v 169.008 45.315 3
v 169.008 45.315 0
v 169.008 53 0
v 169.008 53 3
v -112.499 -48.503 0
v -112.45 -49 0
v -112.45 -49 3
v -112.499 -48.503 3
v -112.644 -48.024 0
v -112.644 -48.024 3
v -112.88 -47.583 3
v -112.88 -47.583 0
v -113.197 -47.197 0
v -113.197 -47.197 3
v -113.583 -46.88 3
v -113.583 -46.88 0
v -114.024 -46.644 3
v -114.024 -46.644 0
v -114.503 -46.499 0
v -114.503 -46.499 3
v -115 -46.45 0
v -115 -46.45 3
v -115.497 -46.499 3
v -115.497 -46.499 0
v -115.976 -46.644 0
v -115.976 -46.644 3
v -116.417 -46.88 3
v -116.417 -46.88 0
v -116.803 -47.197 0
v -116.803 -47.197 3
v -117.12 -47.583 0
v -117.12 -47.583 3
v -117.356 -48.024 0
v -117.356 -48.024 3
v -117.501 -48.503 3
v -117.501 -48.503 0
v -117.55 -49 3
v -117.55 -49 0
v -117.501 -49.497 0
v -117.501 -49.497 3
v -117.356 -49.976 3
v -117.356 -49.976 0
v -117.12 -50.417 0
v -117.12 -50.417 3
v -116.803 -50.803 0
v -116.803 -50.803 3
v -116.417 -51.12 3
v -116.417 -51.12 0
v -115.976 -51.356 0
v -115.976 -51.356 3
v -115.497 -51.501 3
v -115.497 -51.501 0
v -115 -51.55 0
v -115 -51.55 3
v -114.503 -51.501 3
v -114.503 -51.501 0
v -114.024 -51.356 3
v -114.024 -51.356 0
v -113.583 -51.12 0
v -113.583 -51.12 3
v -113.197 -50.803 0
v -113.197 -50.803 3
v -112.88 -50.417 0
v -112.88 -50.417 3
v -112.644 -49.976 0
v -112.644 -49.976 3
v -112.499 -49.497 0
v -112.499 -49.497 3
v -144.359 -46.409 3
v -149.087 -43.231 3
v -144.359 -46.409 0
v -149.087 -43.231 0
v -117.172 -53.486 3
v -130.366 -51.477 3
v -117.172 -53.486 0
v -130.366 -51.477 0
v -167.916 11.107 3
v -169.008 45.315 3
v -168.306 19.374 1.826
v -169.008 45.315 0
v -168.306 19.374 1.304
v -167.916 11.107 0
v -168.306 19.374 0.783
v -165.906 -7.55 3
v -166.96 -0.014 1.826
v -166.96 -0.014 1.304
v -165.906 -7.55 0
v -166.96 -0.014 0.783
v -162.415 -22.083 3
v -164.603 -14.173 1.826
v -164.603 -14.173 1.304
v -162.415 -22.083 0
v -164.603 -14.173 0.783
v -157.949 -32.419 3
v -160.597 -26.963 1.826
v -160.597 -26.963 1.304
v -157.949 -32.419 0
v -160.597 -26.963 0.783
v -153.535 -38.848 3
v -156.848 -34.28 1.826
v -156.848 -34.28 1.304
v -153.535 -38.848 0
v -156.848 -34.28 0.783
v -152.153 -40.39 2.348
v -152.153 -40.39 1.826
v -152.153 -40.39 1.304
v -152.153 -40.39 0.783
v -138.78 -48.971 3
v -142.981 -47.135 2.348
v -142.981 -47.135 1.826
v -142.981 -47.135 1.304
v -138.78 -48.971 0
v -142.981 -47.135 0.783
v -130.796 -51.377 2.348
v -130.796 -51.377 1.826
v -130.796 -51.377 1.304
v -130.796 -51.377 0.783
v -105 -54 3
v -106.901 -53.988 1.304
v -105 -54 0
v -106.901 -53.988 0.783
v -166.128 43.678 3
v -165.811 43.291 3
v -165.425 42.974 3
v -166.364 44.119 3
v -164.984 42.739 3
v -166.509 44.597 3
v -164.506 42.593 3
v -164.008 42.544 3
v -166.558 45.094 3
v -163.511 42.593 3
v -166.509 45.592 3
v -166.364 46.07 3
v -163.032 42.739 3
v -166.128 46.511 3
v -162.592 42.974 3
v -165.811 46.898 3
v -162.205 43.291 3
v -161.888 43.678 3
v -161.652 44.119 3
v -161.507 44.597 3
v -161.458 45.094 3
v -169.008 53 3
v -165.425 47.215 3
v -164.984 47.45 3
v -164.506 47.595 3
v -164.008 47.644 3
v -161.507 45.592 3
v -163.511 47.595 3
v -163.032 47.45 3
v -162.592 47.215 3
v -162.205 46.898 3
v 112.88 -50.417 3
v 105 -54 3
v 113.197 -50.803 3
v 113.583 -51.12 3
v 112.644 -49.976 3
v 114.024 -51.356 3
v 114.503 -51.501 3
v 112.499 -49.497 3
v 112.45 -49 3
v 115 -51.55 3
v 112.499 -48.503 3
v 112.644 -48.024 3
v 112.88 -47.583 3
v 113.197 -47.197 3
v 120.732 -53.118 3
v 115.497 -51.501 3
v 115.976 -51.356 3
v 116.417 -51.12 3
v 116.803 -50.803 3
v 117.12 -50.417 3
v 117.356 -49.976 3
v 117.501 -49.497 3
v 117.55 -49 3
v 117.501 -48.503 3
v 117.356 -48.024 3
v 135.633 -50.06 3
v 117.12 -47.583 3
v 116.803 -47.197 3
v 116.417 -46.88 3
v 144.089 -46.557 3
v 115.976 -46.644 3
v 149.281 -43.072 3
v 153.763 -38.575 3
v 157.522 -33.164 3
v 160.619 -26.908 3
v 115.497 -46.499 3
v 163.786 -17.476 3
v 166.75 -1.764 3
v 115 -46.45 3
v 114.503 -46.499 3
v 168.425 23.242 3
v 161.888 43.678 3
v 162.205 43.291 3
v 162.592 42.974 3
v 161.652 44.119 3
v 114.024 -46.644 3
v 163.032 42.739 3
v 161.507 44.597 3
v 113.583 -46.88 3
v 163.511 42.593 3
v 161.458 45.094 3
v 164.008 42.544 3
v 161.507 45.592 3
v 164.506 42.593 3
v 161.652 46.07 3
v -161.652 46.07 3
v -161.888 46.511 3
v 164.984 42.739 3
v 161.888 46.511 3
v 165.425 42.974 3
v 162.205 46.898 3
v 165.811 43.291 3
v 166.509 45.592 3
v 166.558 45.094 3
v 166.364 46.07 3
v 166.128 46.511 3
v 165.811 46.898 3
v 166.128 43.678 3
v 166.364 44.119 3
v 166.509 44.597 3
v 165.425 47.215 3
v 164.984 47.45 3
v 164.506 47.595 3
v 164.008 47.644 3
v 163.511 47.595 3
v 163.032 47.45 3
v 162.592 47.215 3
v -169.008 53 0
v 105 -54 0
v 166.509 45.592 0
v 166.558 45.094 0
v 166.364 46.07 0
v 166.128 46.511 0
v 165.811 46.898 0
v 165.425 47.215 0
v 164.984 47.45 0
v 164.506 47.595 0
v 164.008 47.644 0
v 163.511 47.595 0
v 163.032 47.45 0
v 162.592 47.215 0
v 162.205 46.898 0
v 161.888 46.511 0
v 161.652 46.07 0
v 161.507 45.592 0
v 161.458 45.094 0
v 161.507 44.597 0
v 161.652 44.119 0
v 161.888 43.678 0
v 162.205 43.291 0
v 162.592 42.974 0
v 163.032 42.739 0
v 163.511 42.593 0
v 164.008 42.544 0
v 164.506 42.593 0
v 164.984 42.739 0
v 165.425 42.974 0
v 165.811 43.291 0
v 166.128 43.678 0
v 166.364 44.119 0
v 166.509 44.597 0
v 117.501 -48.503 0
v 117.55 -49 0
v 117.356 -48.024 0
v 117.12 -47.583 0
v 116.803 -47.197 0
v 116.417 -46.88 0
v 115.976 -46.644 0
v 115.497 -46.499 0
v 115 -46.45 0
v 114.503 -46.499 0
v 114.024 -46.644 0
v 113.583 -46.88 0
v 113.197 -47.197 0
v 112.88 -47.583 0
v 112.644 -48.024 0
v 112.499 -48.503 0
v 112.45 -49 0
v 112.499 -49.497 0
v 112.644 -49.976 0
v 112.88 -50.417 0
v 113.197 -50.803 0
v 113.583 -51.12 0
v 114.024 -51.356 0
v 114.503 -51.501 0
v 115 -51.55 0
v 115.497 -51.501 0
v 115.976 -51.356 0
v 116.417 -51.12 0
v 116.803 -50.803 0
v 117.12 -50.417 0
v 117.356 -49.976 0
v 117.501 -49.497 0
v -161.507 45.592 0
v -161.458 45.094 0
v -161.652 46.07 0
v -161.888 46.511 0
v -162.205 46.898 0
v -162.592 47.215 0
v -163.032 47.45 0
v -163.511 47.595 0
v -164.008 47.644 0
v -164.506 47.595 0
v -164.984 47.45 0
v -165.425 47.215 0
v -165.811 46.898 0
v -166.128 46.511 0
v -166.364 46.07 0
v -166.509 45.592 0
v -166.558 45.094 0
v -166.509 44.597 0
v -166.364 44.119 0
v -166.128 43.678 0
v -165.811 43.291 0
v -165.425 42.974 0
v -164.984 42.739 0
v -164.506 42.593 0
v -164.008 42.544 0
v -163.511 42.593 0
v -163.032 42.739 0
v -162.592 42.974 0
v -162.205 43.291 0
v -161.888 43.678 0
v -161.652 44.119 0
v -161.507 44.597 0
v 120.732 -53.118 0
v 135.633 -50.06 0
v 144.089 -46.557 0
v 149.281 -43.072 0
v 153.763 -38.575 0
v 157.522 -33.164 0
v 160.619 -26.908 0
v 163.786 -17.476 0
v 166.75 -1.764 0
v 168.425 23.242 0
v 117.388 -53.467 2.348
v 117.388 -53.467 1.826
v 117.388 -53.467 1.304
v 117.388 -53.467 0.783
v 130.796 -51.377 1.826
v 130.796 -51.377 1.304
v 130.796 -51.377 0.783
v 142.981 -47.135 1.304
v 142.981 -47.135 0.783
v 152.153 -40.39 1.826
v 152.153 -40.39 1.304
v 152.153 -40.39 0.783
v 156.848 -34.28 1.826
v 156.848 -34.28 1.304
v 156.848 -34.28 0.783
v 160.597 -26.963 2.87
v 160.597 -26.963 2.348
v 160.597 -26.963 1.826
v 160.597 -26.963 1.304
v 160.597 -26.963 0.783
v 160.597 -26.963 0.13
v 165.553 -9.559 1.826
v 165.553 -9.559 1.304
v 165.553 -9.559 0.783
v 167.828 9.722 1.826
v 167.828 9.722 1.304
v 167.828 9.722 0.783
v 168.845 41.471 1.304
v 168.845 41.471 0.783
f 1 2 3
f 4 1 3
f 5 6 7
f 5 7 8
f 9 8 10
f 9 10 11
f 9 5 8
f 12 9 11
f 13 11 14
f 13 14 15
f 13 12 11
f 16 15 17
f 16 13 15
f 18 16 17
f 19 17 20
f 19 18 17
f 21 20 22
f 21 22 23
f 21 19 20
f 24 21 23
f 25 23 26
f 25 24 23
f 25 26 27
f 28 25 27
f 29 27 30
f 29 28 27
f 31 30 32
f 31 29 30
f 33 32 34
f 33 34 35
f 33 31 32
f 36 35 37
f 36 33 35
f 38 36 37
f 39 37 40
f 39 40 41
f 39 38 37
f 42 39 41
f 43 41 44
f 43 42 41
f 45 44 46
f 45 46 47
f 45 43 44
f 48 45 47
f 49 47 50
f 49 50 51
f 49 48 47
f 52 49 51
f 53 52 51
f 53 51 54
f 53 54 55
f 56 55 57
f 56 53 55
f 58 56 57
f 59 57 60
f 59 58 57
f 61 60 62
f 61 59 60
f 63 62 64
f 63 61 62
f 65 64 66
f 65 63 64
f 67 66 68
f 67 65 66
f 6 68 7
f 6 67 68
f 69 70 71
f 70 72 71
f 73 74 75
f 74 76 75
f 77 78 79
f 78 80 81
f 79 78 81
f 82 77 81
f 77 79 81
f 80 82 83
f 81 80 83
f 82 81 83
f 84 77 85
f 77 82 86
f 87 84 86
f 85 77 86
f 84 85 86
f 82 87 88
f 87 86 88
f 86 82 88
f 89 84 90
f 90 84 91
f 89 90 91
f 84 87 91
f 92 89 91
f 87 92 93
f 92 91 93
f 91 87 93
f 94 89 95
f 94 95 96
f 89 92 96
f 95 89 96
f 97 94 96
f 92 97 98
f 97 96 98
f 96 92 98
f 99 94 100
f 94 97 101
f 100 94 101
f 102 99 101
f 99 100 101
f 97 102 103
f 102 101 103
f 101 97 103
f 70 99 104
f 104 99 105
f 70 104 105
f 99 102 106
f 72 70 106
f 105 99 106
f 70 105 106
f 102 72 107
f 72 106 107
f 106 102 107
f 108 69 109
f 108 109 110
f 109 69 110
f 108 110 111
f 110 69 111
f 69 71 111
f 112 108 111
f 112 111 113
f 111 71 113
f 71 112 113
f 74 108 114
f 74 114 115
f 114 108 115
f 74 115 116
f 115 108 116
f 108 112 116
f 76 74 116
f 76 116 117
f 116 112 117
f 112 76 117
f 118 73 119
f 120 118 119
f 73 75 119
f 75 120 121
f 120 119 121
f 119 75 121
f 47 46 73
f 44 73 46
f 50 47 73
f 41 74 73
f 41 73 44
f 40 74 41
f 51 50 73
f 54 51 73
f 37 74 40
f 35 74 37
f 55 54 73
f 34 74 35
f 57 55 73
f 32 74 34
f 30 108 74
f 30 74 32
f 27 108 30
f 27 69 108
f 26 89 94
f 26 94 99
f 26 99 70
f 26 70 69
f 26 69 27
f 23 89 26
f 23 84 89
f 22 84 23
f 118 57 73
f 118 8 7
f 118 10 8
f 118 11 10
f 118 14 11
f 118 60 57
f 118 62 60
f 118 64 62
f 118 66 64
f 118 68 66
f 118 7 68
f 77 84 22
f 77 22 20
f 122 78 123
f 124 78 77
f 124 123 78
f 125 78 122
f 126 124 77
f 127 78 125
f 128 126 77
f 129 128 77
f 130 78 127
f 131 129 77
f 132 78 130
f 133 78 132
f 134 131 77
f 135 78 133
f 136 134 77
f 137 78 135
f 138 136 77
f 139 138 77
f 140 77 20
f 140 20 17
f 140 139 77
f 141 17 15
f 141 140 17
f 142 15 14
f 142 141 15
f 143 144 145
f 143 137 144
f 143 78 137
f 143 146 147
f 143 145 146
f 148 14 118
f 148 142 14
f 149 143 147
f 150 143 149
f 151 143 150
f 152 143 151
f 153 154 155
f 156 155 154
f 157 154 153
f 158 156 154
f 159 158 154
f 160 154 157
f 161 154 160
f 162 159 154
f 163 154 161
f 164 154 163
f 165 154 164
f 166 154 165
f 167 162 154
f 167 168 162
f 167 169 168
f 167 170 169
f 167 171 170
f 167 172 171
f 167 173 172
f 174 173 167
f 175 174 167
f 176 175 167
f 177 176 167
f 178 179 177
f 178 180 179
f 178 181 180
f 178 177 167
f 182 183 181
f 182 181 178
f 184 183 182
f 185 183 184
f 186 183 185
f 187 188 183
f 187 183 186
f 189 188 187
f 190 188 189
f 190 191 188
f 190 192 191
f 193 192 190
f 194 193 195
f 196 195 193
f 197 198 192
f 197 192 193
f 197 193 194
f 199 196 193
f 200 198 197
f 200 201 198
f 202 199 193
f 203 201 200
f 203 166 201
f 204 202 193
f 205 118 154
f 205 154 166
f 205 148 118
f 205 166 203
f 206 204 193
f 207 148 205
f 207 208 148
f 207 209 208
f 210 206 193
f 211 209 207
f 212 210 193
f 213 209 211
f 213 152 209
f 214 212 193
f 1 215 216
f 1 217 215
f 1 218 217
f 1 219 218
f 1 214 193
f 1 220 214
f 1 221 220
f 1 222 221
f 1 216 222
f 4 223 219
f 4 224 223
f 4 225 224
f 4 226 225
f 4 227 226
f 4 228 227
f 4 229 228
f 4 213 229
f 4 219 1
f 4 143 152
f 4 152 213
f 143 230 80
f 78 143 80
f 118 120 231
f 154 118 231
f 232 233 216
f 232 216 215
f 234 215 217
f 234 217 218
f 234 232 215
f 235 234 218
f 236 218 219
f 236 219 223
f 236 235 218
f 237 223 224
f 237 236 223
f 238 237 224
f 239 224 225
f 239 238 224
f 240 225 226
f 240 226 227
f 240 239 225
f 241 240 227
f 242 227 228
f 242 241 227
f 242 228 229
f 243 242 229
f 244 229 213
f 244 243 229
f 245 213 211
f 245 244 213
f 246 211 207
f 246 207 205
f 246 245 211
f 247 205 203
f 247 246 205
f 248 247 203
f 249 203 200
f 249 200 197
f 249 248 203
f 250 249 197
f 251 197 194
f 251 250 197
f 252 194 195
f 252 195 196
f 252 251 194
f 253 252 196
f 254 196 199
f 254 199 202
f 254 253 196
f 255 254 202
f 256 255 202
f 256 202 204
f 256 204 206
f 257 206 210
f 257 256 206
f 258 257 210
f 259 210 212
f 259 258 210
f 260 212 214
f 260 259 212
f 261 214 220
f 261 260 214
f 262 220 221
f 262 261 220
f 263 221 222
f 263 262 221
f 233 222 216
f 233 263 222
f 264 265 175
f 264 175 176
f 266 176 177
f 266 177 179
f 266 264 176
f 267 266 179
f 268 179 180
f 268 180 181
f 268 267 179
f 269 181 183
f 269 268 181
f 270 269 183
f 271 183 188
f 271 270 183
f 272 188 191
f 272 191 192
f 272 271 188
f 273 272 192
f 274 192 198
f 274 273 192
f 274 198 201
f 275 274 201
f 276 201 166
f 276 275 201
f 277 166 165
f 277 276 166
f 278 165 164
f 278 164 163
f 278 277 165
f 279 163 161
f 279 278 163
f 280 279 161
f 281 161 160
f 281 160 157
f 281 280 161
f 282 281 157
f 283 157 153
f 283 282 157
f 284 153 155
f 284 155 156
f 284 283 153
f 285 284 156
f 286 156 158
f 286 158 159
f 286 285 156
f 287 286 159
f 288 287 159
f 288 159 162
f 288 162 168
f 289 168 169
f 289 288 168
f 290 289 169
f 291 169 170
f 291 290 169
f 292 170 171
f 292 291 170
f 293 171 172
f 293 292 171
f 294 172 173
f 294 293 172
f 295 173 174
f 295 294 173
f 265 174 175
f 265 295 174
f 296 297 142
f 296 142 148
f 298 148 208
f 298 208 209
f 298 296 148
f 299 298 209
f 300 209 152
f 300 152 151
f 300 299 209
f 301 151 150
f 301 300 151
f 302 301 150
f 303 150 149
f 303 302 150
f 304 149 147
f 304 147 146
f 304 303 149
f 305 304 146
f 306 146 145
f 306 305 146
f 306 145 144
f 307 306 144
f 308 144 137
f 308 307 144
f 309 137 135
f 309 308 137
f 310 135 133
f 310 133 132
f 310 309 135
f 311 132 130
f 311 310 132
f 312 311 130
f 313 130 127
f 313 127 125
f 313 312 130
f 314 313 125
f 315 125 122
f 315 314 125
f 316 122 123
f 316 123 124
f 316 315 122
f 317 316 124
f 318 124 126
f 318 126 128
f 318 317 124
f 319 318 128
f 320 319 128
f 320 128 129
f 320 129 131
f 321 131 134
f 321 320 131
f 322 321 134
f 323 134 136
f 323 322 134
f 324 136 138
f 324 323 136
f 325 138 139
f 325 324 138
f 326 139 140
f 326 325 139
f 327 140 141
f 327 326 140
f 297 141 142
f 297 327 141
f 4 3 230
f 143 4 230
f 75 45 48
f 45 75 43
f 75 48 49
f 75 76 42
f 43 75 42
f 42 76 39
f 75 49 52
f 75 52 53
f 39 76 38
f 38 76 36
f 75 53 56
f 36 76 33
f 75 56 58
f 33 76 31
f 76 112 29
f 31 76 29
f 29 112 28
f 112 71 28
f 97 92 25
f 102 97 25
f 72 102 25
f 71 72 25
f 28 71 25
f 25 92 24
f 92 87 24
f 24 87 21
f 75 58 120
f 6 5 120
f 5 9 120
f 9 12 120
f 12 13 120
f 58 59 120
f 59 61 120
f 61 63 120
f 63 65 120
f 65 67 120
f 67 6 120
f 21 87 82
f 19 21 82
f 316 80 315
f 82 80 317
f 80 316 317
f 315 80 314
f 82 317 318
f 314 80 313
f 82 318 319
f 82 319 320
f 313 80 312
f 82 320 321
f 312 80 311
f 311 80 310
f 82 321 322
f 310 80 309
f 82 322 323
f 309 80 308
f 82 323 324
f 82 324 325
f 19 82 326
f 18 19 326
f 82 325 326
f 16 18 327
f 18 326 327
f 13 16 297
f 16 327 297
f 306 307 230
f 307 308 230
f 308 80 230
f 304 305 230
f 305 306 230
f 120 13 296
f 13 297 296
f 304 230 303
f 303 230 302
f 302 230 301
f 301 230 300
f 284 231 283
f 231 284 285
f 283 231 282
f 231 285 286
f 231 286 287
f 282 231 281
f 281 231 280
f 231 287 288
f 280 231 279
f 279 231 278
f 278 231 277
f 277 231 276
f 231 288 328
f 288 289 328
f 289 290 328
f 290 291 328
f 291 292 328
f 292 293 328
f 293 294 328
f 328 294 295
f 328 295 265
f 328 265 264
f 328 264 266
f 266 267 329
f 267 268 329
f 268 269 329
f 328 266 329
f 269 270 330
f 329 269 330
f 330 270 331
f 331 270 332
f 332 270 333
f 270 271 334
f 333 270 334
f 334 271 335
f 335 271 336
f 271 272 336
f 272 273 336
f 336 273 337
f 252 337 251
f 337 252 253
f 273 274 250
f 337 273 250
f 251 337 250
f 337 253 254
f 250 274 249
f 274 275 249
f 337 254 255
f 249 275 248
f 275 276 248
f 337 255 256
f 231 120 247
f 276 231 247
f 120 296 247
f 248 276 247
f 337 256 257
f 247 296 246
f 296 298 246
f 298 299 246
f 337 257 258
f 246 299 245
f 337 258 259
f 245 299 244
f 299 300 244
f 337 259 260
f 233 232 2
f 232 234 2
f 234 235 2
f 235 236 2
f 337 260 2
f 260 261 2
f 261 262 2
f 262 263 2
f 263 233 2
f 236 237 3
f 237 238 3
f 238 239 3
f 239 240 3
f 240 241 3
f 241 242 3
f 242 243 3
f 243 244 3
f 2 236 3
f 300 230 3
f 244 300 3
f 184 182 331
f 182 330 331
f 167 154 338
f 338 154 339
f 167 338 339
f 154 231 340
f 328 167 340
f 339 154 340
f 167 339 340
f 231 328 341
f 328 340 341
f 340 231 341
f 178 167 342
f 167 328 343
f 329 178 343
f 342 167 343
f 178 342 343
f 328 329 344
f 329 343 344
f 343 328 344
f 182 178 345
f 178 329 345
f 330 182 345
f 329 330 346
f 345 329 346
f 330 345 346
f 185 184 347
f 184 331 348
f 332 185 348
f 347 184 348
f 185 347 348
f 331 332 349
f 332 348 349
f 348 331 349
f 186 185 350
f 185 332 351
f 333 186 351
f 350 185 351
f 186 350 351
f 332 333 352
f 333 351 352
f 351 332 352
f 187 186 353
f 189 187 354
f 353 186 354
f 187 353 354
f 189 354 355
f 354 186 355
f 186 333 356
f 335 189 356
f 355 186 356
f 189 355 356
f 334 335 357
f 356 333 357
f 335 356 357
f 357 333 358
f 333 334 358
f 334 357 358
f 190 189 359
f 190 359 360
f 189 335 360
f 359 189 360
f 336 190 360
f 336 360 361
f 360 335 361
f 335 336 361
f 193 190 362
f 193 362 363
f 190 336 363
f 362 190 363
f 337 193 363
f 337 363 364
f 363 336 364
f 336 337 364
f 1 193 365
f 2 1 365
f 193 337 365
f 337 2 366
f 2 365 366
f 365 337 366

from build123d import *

# Parameters (mm, degrees)
SKETCH1_R           = 2.55
BOSS_EXTRUDE1_DEPTH = 3


with BuildPart() as part:
    # Sketch1 → Boss-Extrude1 (new body)
    with BuildSketch(Plane.XY):
        with BuildLine():
            Line((-105, -54), (100, -54))
            Line((100, -54), (105, -54))
            add(Edge.make_bspline(
                [(105, -54), (105.633650265, -54), (106.881350102, -53.992530991), (109.533261796, -53.942858593), (113.002635879, -53.806598388), (117.368936619, -53.49600414), (123.340327478, -52.849607512), (130.886920155, -51.540181374), (137.977949802, -49.415694367), (143.046435341, -47.17802551), (146.457254694, -45.240644354), (149.463967226, -43.015271385), (153.1088048, -39.588275674), (157.002885974, -34.485193361), (161.991627546, -24.682375059), (165.206606421, -12.835783475), (167.050380258, -0.044883033), (167.892991031, 9.735563334), (168.344262076, 19.431846102), (168.526520827, 27.223607092), (168.637619604, 33.160096745), (168.724670595, 37.437176727), (168.817878604, 40.827620977), (168.916739733, 43.436637469), (168.975148793, 44.683971364), (169.008250027, 45.314534983)],
                knots=[0, 0, 0, 0, 0.015625, 0.03125, 0.0625, 0.09375, 0.125, 0.1875, 0.25, 0.28125, 0.3125, 0.34375, 0.375, 0.4375, 0.5, 0.625, 0.6875, 0.75, 0.8125, 0.875, 0.90625, 0.9375, 0.96875, 0.984375, 1, 1, 1, 1], degree=3))
            Line((169.008250027, 45.314534983), (169.008250027, 53))
            Line((169.008250027, 53), (159.008250027, 53))
            Line((159.008250027, 53), (-169.008250027, 53))
            Line((-169.008250027, 53), (-169.008250027, 45.314534983))
            add(Edge.make_bspline(
                [(-169.008250027, 45.314534983), (-168.975148793, 44.683971364), (-168.916739733, 43.436637469), (-168.817878604, 40.827620977), (-168.724670595, 37.437176727), (-168.637619604, 33.160096745), (-168.526520827, 27.223607092), (-168.344262076, 19.431846102), (-167.892991031, 9.735563334), (-167.050380258, -0.044883033), (-165.206606421, -12.835783475), (-161.991627546, -24.682375059), (-157.002885974, -34.485193361), (-153.1088048, -39.588275674), (-149.463967226, -43.015271385), (-146.457254694, -45.240644354), (-143.046435341, -47.17802551), (-137.977949802, -49.415694367), (-130.886920155, -51.540181374), (-123.340327478, -52.849607512), (-117.368936619, -53.49600414), (-113.002635879, -53.806598388), (-109.533261796, -53.942858593), (-106.881350102, -53.992530991), (-105.633650265, -54), (-105, -54)],
                knots=[0, 0, 0, 0, 0.015625, 0.03125, 0.0625, 0.09375, 0.125, 0.1875, 0.25, 0.3125, 0.375, 0.5, 0.5625, 0.625, 0.65625, 0.6875, 0.71875, 0.75, 0.8125, 0.875, 0.90625, 0.9375, 0.96875, 0.984375, 1, 1, 1, 1], degree=3))
        make_face()
        with Locations((-164.008250027, 45.094493973)):
            Circle(SKETCH1_R, mode=Mode.SUBTRACT)
        with Locations((-115, -49)):
            Circle(SKETCH1_R, mode=Mode.SUBTRACT)
        with Locations((164.008250027, 45.094493973)):
            Circle(SKETCH1_R, mode=Mode.SUBTRACT)
        with Locations((115, -49)):
            Circle(SKETCH1_R, mode=Mode.SUBTRACT)
    extrude(amount=BOSS_EXTRUDE1_DEPTH)


solid = part.part
